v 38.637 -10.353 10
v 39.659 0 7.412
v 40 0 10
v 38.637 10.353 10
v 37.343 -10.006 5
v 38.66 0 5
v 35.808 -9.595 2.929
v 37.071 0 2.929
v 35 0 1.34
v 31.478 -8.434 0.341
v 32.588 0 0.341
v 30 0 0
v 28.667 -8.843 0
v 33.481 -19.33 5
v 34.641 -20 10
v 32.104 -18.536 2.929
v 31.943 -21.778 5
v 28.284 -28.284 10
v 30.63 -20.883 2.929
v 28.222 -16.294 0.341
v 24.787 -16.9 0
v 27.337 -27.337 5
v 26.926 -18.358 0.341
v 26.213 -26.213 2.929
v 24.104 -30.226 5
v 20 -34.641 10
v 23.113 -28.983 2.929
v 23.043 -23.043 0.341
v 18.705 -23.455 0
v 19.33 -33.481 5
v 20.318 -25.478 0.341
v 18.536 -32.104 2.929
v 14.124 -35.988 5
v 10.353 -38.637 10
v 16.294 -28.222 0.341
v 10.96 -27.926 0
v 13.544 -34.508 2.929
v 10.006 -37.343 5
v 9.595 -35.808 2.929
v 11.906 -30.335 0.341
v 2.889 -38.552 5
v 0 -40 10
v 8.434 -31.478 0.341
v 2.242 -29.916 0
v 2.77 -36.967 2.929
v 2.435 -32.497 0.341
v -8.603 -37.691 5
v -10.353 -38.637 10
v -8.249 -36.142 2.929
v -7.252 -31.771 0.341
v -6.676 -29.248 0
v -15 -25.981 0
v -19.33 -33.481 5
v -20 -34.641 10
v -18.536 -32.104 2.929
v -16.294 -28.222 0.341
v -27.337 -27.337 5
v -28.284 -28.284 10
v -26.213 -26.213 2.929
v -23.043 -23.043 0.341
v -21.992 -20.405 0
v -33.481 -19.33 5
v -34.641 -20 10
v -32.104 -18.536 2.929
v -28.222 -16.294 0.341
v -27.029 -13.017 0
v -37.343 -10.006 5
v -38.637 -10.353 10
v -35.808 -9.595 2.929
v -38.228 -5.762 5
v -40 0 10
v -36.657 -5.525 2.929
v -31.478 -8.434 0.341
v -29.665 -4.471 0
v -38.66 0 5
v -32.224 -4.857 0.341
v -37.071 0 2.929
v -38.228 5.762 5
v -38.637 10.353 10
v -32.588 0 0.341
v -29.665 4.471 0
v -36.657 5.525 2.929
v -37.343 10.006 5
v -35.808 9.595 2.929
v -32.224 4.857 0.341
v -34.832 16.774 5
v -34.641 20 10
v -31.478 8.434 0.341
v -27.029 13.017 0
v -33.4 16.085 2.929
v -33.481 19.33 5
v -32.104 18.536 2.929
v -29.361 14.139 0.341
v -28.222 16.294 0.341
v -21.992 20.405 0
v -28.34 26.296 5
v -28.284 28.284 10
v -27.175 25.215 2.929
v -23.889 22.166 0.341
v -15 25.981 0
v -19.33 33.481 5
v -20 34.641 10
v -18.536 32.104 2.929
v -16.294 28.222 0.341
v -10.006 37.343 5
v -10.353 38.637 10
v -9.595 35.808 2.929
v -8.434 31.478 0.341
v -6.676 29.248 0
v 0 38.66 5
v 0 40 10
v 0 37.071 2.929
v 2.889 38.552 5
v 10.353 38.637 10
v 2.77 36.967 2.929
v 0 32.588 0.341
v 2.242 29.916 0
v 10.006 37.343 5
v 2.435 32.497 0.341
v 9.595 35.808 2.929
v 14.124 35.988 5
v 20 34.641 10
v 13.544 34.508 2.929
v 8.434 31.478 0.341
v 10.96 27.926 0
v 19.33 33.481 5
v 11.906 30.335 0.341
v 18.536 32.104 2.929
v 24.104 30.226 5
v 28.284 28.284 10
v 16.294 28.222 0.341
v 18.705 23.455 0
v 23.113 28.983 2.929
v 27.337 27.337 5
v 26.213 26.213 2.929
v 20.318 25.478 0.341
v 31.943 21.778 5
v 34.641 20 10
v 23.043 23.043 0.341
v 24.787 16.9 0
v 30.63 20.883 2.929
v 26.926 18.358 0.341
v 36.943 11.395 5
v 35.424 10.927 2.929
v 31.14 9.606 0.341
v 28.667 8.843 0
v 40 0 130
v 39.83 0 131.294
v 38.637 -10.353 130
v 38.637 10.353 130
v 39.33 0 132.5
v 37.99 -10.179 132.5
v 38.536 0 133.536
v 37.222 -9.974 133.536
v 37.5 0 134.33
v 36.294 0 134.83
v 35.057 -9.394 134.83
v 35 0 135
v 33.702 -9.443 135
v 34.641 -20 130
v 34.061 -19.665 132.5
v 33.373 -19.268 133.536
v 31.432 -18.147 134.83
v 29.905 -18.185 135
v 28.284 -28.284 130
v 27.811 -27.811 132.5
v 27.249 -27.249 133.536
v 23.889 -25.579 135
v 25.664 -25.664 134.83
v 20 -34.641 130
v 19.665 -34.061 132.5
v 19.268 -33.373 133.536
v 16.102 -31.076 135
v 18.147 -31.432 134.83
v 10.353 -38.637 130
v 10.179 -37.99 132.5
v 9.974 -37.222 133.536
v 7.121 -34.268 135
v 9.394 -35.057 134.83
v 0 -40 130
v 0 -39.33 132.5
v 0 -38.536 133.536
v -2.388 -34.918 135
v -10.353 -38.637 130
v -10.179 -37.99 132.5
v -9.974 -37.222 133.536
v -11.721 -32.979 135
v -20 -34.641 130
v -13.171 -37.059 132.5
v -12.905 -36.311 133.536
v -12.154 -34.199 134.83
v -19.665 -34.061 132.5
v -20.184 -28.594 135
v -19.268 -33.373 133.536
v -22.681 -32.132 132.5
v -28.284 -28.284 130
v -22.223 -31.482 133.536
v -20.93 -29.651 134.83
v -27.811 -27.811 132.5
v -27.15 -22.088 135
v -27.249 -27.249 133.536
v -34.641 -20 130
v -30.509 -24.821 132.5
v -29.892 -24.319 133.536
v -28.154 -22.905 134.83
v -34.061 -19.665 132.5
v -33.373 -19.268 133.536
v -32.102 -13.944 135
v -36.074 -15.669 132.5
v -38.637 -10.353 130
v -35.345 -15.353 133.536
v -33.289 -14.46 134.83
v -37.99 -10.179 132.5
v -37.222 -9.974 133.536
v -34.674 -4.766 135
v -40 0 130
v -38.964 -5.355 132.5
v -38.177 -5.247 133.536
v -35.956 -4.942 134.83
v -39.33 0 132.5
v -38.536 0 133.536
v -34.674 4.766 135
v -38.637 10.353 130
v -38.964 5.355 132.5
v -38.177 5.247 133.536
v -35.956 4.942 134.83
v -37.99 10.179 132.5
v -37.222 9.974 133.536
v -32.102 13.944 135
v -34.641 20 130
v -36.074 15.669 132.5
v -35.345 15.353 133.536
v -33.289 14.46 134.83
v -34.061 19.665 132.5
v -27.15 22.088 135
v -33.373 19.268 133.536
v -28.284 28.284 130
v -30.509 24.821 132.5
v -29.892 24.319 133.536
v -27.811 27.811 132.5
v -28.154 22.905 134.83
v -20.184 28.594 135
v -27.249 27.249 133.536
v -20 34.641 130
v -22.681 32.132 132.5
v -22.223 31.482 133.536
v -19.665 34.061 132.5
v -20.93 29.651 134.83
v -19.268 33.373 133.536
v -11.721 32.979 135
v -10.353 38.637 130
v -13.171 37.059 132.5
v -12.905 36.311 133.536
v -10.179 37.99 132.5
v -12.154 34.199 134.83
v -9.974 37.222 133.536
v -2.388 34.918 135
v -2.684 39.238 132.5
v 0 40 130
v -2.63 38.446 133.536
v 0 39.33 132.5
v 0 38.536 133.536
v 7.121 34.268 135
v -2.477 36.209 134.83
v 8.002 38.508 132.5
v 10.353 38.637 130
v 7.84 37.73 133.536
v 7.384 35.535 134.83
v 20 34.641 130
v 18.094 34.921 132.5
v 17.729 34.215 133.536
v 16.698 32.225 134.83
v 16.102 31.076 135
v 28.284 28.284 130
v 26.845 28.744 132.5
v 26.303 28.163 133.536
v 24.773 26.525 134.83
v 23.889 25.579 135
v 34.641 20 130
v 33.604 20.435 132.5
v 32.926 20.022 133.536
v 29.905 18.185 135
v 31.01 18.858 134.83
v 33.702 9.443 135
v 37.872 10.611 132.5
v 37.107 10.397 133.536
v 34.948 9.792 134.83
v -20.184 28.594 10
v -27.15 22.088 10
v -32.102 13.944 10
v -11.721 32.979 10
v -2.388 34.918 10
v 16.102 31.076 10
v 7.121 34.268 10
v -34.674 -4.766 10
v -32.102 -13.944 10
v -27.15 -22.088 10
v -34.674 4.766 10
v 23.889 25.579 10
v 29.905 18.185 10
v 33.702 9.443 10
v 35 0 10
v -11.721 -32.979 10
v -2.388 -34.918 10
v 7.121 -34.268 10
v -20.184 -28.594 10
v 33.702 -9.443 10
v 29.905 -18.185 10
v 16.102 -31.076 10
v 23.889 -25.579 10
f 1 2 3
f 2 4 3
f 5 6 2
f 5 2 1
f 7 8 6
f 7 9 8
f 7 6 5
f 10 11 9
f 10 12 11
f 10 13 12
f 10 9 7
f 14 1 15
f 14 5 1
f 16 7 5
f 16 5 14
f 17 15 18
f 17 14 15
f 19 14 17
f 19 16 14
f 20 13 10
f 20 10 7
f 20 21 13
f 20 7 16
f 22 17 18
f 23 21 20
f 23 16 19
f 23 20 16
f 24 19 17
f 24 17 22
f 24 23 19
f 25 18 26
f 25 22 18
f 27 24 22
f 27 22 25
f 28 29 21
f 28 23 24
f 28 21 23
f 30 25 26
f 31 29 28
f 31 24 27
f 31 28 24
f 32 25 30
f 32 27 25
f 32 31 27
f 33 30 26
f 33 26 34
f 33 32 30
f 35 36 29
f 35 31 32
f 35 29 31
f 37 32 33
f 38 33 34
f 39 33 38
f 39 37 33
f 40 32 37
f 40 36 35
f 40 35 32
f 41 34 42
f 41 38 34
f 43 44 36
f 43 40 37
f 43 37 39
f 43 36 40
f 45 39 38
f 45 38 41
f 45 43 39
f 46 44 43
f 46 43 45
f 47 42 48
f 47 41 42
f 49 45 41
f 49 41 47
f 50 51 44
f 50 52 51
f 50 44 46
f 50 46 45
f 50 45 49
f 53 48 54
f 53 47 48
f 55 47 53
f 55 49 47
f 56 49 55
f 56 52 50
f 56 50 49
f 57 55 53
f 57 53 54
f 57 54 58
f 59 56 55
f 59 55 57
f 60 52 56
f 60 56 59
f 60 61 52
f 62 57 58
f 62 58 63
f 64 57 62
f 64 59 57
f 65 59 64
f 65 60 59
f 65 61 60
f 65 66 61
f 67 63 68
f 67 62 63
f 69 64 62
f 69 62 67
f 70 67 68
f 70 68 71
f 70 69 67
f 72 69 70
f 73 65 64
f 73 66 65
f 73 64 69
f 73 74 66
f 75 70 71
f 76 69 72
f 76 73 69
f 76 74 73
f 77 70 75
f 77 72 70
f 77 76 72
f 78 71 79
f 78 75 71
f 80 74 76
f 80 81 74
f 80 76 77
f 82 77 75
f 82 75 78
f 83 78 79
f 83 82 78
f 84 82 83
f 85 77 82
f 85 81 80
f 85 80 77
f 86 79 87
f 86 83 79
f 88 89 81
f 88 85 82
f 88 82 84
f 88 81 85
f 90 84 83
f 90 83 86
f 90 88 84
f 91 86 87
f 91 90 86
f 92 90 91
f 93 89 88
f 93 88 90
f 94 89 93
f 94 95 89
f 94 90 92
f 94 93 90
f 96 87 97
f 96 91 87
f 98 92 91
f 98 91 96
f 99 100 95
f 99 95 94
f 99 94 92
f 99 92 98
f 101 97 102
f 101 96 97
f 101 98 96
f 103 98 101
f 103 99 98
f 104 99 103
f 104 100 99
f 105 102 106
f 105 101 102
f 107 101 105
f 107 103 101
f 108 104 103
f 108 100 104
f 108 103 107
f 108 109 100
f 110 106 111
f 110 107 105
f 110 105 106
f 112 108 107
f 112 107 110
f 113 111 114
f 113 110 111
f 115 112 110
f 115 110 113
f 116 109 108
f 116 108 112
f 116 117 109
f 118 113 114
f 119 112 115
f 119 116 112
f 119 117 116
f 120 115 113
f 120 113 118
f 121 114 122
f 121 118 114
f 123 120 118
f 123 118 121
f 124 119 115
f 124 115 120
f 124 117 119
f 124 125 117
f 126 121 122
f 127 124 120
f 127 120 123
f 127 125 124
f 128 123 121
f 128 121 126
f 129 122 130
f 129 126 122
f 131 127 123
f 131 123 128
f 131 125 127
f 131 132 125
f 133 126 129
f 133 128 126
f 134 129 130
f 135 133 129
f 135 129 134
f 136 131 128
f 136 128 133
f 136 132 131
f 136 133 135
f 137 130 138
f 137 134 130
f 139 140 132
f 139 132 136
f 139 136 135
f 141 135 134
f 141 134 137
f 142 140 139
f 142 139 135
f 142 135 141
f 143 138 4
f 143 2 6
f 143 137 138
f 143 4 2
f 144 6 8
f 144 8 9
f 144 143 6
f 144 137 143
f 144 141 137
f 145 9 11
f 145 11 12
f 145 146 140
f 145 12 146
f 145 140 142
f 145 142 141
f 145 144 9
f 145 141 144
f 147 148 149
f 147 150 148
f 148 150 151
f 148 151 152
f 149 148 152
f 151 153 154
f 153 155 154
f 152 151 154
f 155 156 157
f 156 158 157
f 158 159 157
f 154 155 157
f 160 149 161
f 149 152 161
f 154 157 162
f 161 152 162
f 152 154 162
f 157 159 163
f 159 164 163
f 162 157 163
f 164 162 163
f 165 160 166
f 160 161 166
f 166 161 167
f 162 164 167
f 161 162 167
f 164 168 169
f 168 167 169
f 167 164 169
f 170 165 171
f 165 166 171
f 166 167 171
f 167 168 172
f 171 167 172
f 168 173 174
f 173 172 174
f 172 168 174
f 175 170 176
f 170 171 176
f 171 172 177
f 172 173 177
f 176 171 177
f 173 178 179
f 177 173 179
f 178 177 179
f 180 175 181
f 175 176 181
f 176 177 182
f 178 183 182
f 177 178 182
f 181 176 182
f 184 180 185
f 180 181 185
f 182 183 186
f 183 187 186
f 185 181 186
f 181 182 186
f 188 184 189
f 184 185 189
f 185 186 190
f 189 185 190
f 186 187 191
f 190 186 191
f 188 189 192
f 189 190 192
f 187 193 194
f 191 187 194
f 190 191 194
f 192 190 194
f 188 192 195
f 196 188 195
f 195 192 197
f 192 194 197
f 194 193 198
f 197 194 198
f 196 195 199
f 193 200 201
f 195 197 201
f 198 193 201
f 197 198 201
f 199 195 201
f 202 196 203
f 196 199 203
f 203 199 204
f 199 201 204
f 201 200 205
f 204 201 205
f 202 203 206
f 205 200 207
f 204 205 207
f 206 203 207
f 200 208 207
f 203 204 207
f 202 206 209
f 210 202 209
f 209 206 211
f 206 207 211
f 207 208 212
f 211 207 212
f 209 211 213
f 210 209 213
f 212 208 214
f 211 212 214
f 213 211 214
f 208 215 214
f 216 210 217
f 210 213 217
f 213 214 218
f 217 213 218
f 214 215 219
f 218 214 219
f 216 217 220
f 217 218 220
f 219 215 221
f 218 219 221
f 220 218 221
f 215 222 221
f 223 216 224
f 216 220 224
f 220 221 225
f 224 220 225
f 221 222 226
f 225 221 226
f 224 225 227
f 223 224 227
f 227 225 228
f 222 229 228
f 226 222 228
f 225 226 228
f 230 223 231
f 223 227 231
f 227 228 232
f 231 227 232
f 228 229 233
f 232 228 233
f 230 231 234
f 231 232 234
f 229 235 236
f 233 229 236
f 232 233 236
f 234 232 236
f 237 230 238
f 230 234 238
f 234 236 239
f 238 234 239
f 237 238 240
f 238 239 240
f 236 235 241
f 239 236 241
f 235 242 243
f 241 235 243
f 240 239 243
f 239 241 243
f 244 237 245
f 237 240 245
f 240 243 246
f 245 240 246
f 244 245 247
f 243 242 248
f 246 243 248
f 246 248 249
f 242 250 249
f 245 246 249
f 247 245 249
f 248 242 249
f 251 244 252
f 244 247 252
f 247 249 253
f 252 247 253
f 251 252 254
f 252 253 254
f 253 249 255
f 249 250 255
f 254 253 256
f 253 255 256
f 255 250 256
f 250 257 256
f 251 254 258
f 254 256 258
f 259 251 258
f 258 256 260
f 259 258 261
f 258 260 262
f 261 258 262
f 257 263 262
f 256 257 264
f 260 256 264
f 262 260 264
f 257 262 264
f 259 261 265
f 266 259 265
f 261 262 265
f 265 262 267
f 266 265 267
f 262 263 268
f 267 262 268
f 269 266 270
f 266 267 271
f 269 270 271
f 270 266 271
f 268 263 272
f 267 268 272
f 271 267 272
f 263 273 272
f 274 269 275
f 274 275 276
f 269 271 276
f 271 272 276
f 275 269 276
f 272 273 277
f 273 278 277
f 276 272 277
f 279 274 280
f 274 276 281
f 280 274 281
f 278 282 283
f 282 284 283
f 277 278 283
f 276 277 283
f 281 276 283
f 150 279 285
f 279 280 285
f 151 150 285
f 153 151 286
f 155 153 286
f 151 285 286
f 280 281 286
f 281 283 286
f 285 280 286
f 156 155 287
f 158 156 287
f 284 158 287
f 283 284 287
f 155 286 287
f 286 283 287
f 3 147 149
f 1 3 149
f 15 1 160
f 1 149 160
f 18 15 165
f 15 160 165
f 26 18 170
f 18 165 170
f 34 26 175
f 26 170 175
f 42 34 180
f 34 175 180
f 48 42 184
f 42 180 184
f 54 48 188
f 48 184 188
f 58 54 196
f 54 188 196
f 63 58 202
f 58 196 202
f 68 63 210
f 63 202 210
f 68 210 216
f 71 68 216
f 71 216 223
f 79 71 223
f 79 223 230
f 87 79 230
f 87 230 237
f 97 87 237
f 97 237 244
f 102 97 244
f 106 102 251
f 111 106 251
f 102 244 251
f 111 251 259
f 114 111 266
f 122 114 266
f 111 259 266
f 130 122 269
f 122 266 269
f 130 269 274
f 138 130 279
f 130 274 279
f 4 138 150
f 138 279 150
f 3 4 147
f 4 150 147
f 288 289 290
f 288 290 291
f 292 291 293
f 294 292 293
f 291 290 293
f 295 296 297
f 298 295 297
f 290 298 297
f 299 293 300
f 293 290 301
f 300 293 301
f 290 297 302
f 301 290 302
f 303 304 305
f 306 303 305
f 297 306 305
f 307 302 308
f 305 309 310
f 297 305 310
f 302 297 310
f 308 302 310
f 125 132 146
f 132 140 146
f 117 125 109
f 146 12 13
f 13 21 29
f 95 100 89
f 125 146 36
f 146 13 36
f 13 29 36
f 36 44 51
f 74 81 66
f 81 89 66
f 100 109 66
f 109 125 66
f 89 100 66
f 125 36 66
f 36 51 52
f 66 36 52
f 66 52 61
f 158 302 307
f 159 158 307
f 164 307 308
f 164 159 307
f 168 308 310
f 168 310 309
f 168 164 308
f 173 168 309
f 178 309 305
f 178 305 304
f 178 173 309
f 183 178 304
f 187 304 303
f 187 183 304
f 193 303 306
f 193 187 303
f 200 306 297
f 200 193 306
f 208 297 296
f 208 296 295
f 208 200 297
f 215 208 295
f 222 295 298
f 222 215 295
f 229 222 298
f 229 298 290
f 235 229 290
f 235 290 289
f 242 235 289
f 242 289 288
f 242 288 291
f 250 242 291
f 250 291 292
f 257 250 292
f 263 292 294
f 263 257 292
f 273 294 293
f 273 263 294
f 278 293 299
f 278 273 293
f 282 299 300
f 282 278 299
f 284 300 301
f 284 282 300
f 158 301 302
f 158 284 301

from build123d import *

# Parameters (mm, degrees)
F0_W   = 35
F0_H   = 10
F0_W_2 = 5
F0_H_2 = 125
F2_R   = 4.99999
F3_R   = 10


# Not quite as in the source:
# - a fillet or chamfer is up to 0.001 mm smaller than in the source, because OpenCascade refuses the exact size


with BuildPart() as f1:
    # F0 (on Front) → F1 (revolve)
    with BuildSketch(Plane.XZ):
        with Locations((17.5, 5)):
            Rectangle(F0_W, F0_H)
        with Locations((37.5, 5)):
            Rectangle(F0_W_2, F0_H)
        with Locations((37.5, 72.5)):
            Rectangle(F0_W_2, F0_H_2)
    revolve(axis=Axis((0, 0, 5), (0, 0, -1)))

    # F2 (radius 5 in the source; OpenCascade refuses exactly that, so slightly less here)
    f2_edges = [f1.edges().sort_by_distance(p)[0] for p in [
        (-40, 0, 135),
    ]]
    fillet(f2_edges, radius=F2_R)

    # F3
    f3_edges = [f1.edges().sort_by_distance(p)[0] for p in [
        (-40, 0, 0),
    ]]
    fillet(f3_edges, radius=F3_R)


solid = f1.part
